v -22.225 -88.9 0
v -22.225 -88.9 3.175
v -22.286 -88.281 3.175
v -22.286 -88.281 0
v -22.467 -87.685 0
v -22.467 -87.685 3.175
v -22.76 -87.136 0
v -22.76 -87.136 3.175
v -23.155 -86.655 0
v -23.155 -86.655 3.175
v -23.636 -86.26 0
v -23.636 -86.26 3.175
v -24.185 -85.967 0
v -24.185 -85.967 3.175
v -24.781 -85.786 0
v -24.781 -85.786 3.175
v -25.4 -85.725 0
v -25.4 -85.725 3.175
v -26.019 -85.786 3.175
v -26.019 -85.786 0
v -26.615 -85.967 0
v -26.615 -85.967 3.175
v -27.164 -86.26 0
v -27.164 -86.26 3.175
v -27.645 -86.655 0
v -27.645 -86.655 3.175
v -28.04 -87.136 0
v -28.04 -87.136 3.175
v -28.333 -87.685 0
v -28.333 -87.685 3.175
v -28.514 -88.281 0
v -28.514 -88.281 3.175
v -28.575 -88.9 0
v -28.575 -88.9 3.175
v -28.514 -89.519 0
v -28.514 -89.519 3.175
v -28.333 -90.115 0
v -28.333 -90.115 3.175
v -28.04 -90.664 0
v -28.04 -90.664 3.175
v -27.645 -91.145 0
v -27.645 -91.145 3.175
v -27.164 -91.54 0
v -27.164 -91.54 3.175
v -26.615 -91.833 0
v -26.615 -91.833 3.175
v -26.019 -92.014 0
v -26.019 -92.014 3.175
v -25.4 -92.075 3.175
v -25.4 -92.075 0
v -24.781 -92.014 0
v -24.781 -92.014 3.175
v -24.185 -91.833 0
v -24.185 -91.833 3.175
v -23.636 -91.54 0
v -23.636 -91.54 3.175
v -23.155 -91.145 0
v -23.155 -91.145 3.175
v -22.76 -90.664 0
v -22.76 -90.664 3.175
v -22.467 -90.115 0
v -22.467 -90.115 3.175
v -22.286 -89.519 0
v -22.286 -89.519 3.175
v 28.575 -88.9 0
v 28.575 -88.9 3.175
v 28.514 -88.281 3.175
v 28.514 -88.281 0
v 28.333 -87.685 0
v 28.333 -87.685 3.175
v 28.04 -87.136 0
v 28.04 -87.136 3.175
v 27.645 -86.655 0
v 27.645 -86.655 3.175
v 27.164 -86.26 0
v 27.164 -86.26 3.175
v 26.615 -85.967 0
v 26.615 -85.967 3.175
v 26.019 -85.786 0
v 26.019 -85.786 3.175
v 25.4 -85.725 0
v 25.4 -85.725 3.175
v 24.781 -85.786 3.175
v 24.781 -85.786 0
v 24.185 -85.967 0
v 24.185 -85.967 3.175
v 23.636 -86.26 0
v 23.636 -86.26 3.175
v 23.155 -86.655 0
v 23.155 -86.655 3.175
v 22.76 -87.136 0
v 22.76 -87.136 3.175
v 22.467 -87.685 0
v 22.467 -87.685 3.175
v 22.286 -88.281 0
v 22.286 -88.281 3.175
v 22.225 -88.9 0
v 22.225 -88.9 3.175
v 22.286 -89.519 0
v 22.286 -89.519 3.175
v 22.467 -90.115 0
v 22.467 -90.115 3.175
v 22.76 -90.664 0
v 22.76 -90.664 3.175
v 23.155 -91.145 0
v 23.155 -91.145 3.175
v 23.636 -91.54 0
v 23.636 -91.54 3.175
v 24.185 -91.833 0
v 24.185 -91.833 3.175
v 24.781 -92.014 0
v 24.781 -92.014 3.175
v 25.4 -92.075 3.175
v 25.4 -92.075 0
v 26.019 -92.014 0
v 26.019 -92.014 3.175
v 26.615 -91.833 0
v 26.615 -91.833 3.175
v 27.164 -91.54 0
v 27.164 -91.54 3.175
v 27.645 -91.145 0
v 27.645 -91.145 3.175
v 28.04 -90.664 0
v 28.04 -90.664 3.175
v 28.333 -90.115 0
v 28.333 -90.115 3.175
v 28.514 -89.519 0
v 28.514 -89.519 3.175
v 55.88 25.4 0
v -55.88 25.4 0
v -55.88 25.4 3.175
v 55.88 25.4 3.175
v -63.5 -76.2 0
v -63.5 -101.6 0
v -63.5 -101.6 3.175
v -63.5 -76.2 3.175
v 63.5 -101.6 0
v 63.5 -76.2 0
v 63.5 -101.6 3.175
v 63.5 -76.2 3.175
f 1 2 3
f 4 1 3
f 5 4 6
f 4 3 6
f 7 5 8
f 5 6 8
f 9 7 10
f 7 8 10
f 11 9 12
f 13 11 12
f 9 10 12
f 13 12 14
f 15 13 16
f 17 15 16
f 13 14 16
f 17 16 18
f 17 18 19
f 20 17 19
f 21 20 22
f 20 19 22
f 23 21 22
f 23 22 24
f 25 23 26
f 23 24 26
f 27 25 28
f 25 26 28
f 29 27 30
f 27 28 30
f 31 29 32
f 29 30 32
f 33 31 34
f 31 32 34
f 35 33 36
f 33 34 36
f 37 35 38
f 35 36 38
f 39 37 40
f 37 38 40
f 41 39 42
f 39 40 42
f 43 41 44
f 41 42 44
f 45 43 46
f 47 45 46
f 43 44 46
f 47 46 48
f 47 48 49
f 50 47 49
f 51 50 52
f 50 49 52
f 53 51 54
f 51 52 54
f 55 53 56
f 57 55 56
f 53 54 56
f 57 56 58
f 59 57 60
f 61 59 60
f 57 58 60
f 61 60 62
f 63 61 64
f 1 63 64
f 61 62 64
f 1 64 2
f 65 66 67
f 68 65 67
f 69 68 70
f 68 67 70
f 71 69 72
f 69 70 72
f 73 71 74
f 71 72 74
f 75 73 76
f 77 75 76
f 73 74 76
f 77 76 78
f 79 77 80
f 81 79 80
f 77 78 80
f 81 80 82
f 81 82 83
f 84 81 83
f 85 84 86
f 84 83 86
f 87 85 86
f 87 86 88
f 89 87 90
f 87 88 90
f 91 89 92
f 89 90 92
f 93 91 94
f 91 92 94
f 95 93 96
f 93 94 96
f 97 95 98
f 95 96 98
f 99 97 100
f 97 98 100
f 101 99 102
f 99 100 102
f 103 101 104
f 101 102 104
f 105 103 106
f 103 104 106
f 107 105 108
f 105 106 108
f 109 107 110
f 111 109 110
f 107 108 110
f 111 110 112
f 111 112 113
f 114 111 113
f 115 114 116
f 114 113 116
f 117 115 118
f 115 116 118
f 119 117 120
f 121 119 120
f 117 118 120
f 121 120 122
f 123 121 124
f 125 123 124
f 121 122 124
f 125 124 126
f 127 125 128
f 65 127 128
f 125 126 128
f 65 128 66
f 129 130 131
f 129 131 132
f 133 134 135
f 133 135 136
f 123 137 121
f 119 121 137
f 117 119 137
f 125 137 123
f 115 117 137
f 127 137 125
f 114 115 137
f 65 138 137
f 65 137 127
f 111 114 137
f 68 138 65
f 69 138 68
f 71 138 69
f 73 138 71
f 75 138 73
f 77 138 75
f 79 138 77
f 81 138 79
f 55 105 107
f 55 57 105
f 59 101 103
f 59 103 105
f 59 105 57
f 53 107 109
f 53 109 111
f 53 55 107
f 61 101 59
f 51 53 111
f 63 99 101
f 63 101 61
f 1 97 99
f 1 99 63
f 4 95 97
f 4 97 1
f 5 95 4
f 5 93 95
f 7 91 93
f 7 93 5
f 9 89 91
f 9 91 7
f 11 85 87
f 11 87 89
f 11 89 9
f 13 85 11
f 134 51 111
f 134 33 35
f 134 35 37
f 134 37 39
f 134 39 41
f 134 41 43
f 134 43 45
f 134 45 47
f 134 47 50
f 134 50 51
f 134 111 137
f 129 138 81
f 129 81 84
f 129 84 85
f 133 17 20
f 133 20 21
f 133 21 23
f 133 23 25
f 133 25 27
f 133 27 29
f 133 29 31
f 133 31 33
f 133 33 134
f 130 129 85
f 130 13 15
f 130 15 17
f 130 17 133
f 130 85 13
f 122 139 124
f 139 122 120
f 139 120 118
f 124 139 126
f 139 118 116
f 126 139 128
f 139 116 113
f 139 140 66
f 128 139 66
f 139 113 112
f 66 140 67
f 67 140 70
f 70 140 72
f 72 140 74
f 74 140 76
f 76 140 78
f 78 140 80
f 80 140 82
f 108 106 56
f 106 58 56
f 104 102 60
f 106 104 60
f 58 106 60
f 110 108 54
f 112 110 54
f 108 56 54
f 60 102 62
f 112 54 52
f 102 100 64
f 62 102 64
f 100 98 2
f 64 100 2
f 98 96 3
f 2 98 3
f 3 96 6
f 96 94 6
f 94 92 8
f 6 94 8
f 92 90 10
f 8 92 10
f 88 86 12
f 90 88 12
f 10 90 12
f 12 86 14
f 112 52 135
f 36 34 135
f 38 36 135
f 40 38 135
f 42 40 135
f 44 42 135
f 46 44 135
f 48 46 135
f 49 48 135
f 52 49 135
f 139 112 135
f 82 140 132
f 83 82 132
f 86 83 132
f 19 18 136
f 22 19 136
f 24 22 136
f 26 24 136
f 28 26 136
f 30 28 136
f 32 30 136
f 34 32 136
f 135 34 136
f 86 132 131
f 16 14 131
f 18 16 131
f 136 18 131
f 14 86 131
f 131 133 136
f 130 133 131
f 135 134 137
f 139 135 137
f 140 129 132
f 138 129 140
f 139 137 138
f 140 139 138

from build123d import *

# Parameters (mm, degrees)
SKETCH1_W           = 127
SKETCH1_H           = 25.4
BOSS_EXTRUDE1_DEPTH = 3.175
SKETCH2_R           = 3.175
CUT_EXTRUDE1_DEPTH  = 3.175


with BuildPart() as part:
    # Sketch1 → Boss-Extrude1 (new body)
    with BuildSketch(Plane.XY):
        Polygon((55.88, 25.4), (63.5, -76.2), (-63.5, -76.2), (-55.88, 25.4), align=None)
        with Locations((0, -88.9)):
            Rectangle(SKETCH1_W, SKETCH1_H)
    extrude(amount=BOSS_EXTRUDE1_DEPTH)

    # Sketch2 → Cut-Extrude1 (cut)
    with BuildSketch(Plane.XY.offset(3.175)):
        with Locations((-25.4, -88.9)):
            Circle(SKETCH2_R)
        with Locations((25.4, -88.9)):
            Circle(SKETCH2_R)
    extrude(amount=-CUT_EXTRUDE1_DEPTH, mode=Mode.SUBTRACT)


solid = part.part
